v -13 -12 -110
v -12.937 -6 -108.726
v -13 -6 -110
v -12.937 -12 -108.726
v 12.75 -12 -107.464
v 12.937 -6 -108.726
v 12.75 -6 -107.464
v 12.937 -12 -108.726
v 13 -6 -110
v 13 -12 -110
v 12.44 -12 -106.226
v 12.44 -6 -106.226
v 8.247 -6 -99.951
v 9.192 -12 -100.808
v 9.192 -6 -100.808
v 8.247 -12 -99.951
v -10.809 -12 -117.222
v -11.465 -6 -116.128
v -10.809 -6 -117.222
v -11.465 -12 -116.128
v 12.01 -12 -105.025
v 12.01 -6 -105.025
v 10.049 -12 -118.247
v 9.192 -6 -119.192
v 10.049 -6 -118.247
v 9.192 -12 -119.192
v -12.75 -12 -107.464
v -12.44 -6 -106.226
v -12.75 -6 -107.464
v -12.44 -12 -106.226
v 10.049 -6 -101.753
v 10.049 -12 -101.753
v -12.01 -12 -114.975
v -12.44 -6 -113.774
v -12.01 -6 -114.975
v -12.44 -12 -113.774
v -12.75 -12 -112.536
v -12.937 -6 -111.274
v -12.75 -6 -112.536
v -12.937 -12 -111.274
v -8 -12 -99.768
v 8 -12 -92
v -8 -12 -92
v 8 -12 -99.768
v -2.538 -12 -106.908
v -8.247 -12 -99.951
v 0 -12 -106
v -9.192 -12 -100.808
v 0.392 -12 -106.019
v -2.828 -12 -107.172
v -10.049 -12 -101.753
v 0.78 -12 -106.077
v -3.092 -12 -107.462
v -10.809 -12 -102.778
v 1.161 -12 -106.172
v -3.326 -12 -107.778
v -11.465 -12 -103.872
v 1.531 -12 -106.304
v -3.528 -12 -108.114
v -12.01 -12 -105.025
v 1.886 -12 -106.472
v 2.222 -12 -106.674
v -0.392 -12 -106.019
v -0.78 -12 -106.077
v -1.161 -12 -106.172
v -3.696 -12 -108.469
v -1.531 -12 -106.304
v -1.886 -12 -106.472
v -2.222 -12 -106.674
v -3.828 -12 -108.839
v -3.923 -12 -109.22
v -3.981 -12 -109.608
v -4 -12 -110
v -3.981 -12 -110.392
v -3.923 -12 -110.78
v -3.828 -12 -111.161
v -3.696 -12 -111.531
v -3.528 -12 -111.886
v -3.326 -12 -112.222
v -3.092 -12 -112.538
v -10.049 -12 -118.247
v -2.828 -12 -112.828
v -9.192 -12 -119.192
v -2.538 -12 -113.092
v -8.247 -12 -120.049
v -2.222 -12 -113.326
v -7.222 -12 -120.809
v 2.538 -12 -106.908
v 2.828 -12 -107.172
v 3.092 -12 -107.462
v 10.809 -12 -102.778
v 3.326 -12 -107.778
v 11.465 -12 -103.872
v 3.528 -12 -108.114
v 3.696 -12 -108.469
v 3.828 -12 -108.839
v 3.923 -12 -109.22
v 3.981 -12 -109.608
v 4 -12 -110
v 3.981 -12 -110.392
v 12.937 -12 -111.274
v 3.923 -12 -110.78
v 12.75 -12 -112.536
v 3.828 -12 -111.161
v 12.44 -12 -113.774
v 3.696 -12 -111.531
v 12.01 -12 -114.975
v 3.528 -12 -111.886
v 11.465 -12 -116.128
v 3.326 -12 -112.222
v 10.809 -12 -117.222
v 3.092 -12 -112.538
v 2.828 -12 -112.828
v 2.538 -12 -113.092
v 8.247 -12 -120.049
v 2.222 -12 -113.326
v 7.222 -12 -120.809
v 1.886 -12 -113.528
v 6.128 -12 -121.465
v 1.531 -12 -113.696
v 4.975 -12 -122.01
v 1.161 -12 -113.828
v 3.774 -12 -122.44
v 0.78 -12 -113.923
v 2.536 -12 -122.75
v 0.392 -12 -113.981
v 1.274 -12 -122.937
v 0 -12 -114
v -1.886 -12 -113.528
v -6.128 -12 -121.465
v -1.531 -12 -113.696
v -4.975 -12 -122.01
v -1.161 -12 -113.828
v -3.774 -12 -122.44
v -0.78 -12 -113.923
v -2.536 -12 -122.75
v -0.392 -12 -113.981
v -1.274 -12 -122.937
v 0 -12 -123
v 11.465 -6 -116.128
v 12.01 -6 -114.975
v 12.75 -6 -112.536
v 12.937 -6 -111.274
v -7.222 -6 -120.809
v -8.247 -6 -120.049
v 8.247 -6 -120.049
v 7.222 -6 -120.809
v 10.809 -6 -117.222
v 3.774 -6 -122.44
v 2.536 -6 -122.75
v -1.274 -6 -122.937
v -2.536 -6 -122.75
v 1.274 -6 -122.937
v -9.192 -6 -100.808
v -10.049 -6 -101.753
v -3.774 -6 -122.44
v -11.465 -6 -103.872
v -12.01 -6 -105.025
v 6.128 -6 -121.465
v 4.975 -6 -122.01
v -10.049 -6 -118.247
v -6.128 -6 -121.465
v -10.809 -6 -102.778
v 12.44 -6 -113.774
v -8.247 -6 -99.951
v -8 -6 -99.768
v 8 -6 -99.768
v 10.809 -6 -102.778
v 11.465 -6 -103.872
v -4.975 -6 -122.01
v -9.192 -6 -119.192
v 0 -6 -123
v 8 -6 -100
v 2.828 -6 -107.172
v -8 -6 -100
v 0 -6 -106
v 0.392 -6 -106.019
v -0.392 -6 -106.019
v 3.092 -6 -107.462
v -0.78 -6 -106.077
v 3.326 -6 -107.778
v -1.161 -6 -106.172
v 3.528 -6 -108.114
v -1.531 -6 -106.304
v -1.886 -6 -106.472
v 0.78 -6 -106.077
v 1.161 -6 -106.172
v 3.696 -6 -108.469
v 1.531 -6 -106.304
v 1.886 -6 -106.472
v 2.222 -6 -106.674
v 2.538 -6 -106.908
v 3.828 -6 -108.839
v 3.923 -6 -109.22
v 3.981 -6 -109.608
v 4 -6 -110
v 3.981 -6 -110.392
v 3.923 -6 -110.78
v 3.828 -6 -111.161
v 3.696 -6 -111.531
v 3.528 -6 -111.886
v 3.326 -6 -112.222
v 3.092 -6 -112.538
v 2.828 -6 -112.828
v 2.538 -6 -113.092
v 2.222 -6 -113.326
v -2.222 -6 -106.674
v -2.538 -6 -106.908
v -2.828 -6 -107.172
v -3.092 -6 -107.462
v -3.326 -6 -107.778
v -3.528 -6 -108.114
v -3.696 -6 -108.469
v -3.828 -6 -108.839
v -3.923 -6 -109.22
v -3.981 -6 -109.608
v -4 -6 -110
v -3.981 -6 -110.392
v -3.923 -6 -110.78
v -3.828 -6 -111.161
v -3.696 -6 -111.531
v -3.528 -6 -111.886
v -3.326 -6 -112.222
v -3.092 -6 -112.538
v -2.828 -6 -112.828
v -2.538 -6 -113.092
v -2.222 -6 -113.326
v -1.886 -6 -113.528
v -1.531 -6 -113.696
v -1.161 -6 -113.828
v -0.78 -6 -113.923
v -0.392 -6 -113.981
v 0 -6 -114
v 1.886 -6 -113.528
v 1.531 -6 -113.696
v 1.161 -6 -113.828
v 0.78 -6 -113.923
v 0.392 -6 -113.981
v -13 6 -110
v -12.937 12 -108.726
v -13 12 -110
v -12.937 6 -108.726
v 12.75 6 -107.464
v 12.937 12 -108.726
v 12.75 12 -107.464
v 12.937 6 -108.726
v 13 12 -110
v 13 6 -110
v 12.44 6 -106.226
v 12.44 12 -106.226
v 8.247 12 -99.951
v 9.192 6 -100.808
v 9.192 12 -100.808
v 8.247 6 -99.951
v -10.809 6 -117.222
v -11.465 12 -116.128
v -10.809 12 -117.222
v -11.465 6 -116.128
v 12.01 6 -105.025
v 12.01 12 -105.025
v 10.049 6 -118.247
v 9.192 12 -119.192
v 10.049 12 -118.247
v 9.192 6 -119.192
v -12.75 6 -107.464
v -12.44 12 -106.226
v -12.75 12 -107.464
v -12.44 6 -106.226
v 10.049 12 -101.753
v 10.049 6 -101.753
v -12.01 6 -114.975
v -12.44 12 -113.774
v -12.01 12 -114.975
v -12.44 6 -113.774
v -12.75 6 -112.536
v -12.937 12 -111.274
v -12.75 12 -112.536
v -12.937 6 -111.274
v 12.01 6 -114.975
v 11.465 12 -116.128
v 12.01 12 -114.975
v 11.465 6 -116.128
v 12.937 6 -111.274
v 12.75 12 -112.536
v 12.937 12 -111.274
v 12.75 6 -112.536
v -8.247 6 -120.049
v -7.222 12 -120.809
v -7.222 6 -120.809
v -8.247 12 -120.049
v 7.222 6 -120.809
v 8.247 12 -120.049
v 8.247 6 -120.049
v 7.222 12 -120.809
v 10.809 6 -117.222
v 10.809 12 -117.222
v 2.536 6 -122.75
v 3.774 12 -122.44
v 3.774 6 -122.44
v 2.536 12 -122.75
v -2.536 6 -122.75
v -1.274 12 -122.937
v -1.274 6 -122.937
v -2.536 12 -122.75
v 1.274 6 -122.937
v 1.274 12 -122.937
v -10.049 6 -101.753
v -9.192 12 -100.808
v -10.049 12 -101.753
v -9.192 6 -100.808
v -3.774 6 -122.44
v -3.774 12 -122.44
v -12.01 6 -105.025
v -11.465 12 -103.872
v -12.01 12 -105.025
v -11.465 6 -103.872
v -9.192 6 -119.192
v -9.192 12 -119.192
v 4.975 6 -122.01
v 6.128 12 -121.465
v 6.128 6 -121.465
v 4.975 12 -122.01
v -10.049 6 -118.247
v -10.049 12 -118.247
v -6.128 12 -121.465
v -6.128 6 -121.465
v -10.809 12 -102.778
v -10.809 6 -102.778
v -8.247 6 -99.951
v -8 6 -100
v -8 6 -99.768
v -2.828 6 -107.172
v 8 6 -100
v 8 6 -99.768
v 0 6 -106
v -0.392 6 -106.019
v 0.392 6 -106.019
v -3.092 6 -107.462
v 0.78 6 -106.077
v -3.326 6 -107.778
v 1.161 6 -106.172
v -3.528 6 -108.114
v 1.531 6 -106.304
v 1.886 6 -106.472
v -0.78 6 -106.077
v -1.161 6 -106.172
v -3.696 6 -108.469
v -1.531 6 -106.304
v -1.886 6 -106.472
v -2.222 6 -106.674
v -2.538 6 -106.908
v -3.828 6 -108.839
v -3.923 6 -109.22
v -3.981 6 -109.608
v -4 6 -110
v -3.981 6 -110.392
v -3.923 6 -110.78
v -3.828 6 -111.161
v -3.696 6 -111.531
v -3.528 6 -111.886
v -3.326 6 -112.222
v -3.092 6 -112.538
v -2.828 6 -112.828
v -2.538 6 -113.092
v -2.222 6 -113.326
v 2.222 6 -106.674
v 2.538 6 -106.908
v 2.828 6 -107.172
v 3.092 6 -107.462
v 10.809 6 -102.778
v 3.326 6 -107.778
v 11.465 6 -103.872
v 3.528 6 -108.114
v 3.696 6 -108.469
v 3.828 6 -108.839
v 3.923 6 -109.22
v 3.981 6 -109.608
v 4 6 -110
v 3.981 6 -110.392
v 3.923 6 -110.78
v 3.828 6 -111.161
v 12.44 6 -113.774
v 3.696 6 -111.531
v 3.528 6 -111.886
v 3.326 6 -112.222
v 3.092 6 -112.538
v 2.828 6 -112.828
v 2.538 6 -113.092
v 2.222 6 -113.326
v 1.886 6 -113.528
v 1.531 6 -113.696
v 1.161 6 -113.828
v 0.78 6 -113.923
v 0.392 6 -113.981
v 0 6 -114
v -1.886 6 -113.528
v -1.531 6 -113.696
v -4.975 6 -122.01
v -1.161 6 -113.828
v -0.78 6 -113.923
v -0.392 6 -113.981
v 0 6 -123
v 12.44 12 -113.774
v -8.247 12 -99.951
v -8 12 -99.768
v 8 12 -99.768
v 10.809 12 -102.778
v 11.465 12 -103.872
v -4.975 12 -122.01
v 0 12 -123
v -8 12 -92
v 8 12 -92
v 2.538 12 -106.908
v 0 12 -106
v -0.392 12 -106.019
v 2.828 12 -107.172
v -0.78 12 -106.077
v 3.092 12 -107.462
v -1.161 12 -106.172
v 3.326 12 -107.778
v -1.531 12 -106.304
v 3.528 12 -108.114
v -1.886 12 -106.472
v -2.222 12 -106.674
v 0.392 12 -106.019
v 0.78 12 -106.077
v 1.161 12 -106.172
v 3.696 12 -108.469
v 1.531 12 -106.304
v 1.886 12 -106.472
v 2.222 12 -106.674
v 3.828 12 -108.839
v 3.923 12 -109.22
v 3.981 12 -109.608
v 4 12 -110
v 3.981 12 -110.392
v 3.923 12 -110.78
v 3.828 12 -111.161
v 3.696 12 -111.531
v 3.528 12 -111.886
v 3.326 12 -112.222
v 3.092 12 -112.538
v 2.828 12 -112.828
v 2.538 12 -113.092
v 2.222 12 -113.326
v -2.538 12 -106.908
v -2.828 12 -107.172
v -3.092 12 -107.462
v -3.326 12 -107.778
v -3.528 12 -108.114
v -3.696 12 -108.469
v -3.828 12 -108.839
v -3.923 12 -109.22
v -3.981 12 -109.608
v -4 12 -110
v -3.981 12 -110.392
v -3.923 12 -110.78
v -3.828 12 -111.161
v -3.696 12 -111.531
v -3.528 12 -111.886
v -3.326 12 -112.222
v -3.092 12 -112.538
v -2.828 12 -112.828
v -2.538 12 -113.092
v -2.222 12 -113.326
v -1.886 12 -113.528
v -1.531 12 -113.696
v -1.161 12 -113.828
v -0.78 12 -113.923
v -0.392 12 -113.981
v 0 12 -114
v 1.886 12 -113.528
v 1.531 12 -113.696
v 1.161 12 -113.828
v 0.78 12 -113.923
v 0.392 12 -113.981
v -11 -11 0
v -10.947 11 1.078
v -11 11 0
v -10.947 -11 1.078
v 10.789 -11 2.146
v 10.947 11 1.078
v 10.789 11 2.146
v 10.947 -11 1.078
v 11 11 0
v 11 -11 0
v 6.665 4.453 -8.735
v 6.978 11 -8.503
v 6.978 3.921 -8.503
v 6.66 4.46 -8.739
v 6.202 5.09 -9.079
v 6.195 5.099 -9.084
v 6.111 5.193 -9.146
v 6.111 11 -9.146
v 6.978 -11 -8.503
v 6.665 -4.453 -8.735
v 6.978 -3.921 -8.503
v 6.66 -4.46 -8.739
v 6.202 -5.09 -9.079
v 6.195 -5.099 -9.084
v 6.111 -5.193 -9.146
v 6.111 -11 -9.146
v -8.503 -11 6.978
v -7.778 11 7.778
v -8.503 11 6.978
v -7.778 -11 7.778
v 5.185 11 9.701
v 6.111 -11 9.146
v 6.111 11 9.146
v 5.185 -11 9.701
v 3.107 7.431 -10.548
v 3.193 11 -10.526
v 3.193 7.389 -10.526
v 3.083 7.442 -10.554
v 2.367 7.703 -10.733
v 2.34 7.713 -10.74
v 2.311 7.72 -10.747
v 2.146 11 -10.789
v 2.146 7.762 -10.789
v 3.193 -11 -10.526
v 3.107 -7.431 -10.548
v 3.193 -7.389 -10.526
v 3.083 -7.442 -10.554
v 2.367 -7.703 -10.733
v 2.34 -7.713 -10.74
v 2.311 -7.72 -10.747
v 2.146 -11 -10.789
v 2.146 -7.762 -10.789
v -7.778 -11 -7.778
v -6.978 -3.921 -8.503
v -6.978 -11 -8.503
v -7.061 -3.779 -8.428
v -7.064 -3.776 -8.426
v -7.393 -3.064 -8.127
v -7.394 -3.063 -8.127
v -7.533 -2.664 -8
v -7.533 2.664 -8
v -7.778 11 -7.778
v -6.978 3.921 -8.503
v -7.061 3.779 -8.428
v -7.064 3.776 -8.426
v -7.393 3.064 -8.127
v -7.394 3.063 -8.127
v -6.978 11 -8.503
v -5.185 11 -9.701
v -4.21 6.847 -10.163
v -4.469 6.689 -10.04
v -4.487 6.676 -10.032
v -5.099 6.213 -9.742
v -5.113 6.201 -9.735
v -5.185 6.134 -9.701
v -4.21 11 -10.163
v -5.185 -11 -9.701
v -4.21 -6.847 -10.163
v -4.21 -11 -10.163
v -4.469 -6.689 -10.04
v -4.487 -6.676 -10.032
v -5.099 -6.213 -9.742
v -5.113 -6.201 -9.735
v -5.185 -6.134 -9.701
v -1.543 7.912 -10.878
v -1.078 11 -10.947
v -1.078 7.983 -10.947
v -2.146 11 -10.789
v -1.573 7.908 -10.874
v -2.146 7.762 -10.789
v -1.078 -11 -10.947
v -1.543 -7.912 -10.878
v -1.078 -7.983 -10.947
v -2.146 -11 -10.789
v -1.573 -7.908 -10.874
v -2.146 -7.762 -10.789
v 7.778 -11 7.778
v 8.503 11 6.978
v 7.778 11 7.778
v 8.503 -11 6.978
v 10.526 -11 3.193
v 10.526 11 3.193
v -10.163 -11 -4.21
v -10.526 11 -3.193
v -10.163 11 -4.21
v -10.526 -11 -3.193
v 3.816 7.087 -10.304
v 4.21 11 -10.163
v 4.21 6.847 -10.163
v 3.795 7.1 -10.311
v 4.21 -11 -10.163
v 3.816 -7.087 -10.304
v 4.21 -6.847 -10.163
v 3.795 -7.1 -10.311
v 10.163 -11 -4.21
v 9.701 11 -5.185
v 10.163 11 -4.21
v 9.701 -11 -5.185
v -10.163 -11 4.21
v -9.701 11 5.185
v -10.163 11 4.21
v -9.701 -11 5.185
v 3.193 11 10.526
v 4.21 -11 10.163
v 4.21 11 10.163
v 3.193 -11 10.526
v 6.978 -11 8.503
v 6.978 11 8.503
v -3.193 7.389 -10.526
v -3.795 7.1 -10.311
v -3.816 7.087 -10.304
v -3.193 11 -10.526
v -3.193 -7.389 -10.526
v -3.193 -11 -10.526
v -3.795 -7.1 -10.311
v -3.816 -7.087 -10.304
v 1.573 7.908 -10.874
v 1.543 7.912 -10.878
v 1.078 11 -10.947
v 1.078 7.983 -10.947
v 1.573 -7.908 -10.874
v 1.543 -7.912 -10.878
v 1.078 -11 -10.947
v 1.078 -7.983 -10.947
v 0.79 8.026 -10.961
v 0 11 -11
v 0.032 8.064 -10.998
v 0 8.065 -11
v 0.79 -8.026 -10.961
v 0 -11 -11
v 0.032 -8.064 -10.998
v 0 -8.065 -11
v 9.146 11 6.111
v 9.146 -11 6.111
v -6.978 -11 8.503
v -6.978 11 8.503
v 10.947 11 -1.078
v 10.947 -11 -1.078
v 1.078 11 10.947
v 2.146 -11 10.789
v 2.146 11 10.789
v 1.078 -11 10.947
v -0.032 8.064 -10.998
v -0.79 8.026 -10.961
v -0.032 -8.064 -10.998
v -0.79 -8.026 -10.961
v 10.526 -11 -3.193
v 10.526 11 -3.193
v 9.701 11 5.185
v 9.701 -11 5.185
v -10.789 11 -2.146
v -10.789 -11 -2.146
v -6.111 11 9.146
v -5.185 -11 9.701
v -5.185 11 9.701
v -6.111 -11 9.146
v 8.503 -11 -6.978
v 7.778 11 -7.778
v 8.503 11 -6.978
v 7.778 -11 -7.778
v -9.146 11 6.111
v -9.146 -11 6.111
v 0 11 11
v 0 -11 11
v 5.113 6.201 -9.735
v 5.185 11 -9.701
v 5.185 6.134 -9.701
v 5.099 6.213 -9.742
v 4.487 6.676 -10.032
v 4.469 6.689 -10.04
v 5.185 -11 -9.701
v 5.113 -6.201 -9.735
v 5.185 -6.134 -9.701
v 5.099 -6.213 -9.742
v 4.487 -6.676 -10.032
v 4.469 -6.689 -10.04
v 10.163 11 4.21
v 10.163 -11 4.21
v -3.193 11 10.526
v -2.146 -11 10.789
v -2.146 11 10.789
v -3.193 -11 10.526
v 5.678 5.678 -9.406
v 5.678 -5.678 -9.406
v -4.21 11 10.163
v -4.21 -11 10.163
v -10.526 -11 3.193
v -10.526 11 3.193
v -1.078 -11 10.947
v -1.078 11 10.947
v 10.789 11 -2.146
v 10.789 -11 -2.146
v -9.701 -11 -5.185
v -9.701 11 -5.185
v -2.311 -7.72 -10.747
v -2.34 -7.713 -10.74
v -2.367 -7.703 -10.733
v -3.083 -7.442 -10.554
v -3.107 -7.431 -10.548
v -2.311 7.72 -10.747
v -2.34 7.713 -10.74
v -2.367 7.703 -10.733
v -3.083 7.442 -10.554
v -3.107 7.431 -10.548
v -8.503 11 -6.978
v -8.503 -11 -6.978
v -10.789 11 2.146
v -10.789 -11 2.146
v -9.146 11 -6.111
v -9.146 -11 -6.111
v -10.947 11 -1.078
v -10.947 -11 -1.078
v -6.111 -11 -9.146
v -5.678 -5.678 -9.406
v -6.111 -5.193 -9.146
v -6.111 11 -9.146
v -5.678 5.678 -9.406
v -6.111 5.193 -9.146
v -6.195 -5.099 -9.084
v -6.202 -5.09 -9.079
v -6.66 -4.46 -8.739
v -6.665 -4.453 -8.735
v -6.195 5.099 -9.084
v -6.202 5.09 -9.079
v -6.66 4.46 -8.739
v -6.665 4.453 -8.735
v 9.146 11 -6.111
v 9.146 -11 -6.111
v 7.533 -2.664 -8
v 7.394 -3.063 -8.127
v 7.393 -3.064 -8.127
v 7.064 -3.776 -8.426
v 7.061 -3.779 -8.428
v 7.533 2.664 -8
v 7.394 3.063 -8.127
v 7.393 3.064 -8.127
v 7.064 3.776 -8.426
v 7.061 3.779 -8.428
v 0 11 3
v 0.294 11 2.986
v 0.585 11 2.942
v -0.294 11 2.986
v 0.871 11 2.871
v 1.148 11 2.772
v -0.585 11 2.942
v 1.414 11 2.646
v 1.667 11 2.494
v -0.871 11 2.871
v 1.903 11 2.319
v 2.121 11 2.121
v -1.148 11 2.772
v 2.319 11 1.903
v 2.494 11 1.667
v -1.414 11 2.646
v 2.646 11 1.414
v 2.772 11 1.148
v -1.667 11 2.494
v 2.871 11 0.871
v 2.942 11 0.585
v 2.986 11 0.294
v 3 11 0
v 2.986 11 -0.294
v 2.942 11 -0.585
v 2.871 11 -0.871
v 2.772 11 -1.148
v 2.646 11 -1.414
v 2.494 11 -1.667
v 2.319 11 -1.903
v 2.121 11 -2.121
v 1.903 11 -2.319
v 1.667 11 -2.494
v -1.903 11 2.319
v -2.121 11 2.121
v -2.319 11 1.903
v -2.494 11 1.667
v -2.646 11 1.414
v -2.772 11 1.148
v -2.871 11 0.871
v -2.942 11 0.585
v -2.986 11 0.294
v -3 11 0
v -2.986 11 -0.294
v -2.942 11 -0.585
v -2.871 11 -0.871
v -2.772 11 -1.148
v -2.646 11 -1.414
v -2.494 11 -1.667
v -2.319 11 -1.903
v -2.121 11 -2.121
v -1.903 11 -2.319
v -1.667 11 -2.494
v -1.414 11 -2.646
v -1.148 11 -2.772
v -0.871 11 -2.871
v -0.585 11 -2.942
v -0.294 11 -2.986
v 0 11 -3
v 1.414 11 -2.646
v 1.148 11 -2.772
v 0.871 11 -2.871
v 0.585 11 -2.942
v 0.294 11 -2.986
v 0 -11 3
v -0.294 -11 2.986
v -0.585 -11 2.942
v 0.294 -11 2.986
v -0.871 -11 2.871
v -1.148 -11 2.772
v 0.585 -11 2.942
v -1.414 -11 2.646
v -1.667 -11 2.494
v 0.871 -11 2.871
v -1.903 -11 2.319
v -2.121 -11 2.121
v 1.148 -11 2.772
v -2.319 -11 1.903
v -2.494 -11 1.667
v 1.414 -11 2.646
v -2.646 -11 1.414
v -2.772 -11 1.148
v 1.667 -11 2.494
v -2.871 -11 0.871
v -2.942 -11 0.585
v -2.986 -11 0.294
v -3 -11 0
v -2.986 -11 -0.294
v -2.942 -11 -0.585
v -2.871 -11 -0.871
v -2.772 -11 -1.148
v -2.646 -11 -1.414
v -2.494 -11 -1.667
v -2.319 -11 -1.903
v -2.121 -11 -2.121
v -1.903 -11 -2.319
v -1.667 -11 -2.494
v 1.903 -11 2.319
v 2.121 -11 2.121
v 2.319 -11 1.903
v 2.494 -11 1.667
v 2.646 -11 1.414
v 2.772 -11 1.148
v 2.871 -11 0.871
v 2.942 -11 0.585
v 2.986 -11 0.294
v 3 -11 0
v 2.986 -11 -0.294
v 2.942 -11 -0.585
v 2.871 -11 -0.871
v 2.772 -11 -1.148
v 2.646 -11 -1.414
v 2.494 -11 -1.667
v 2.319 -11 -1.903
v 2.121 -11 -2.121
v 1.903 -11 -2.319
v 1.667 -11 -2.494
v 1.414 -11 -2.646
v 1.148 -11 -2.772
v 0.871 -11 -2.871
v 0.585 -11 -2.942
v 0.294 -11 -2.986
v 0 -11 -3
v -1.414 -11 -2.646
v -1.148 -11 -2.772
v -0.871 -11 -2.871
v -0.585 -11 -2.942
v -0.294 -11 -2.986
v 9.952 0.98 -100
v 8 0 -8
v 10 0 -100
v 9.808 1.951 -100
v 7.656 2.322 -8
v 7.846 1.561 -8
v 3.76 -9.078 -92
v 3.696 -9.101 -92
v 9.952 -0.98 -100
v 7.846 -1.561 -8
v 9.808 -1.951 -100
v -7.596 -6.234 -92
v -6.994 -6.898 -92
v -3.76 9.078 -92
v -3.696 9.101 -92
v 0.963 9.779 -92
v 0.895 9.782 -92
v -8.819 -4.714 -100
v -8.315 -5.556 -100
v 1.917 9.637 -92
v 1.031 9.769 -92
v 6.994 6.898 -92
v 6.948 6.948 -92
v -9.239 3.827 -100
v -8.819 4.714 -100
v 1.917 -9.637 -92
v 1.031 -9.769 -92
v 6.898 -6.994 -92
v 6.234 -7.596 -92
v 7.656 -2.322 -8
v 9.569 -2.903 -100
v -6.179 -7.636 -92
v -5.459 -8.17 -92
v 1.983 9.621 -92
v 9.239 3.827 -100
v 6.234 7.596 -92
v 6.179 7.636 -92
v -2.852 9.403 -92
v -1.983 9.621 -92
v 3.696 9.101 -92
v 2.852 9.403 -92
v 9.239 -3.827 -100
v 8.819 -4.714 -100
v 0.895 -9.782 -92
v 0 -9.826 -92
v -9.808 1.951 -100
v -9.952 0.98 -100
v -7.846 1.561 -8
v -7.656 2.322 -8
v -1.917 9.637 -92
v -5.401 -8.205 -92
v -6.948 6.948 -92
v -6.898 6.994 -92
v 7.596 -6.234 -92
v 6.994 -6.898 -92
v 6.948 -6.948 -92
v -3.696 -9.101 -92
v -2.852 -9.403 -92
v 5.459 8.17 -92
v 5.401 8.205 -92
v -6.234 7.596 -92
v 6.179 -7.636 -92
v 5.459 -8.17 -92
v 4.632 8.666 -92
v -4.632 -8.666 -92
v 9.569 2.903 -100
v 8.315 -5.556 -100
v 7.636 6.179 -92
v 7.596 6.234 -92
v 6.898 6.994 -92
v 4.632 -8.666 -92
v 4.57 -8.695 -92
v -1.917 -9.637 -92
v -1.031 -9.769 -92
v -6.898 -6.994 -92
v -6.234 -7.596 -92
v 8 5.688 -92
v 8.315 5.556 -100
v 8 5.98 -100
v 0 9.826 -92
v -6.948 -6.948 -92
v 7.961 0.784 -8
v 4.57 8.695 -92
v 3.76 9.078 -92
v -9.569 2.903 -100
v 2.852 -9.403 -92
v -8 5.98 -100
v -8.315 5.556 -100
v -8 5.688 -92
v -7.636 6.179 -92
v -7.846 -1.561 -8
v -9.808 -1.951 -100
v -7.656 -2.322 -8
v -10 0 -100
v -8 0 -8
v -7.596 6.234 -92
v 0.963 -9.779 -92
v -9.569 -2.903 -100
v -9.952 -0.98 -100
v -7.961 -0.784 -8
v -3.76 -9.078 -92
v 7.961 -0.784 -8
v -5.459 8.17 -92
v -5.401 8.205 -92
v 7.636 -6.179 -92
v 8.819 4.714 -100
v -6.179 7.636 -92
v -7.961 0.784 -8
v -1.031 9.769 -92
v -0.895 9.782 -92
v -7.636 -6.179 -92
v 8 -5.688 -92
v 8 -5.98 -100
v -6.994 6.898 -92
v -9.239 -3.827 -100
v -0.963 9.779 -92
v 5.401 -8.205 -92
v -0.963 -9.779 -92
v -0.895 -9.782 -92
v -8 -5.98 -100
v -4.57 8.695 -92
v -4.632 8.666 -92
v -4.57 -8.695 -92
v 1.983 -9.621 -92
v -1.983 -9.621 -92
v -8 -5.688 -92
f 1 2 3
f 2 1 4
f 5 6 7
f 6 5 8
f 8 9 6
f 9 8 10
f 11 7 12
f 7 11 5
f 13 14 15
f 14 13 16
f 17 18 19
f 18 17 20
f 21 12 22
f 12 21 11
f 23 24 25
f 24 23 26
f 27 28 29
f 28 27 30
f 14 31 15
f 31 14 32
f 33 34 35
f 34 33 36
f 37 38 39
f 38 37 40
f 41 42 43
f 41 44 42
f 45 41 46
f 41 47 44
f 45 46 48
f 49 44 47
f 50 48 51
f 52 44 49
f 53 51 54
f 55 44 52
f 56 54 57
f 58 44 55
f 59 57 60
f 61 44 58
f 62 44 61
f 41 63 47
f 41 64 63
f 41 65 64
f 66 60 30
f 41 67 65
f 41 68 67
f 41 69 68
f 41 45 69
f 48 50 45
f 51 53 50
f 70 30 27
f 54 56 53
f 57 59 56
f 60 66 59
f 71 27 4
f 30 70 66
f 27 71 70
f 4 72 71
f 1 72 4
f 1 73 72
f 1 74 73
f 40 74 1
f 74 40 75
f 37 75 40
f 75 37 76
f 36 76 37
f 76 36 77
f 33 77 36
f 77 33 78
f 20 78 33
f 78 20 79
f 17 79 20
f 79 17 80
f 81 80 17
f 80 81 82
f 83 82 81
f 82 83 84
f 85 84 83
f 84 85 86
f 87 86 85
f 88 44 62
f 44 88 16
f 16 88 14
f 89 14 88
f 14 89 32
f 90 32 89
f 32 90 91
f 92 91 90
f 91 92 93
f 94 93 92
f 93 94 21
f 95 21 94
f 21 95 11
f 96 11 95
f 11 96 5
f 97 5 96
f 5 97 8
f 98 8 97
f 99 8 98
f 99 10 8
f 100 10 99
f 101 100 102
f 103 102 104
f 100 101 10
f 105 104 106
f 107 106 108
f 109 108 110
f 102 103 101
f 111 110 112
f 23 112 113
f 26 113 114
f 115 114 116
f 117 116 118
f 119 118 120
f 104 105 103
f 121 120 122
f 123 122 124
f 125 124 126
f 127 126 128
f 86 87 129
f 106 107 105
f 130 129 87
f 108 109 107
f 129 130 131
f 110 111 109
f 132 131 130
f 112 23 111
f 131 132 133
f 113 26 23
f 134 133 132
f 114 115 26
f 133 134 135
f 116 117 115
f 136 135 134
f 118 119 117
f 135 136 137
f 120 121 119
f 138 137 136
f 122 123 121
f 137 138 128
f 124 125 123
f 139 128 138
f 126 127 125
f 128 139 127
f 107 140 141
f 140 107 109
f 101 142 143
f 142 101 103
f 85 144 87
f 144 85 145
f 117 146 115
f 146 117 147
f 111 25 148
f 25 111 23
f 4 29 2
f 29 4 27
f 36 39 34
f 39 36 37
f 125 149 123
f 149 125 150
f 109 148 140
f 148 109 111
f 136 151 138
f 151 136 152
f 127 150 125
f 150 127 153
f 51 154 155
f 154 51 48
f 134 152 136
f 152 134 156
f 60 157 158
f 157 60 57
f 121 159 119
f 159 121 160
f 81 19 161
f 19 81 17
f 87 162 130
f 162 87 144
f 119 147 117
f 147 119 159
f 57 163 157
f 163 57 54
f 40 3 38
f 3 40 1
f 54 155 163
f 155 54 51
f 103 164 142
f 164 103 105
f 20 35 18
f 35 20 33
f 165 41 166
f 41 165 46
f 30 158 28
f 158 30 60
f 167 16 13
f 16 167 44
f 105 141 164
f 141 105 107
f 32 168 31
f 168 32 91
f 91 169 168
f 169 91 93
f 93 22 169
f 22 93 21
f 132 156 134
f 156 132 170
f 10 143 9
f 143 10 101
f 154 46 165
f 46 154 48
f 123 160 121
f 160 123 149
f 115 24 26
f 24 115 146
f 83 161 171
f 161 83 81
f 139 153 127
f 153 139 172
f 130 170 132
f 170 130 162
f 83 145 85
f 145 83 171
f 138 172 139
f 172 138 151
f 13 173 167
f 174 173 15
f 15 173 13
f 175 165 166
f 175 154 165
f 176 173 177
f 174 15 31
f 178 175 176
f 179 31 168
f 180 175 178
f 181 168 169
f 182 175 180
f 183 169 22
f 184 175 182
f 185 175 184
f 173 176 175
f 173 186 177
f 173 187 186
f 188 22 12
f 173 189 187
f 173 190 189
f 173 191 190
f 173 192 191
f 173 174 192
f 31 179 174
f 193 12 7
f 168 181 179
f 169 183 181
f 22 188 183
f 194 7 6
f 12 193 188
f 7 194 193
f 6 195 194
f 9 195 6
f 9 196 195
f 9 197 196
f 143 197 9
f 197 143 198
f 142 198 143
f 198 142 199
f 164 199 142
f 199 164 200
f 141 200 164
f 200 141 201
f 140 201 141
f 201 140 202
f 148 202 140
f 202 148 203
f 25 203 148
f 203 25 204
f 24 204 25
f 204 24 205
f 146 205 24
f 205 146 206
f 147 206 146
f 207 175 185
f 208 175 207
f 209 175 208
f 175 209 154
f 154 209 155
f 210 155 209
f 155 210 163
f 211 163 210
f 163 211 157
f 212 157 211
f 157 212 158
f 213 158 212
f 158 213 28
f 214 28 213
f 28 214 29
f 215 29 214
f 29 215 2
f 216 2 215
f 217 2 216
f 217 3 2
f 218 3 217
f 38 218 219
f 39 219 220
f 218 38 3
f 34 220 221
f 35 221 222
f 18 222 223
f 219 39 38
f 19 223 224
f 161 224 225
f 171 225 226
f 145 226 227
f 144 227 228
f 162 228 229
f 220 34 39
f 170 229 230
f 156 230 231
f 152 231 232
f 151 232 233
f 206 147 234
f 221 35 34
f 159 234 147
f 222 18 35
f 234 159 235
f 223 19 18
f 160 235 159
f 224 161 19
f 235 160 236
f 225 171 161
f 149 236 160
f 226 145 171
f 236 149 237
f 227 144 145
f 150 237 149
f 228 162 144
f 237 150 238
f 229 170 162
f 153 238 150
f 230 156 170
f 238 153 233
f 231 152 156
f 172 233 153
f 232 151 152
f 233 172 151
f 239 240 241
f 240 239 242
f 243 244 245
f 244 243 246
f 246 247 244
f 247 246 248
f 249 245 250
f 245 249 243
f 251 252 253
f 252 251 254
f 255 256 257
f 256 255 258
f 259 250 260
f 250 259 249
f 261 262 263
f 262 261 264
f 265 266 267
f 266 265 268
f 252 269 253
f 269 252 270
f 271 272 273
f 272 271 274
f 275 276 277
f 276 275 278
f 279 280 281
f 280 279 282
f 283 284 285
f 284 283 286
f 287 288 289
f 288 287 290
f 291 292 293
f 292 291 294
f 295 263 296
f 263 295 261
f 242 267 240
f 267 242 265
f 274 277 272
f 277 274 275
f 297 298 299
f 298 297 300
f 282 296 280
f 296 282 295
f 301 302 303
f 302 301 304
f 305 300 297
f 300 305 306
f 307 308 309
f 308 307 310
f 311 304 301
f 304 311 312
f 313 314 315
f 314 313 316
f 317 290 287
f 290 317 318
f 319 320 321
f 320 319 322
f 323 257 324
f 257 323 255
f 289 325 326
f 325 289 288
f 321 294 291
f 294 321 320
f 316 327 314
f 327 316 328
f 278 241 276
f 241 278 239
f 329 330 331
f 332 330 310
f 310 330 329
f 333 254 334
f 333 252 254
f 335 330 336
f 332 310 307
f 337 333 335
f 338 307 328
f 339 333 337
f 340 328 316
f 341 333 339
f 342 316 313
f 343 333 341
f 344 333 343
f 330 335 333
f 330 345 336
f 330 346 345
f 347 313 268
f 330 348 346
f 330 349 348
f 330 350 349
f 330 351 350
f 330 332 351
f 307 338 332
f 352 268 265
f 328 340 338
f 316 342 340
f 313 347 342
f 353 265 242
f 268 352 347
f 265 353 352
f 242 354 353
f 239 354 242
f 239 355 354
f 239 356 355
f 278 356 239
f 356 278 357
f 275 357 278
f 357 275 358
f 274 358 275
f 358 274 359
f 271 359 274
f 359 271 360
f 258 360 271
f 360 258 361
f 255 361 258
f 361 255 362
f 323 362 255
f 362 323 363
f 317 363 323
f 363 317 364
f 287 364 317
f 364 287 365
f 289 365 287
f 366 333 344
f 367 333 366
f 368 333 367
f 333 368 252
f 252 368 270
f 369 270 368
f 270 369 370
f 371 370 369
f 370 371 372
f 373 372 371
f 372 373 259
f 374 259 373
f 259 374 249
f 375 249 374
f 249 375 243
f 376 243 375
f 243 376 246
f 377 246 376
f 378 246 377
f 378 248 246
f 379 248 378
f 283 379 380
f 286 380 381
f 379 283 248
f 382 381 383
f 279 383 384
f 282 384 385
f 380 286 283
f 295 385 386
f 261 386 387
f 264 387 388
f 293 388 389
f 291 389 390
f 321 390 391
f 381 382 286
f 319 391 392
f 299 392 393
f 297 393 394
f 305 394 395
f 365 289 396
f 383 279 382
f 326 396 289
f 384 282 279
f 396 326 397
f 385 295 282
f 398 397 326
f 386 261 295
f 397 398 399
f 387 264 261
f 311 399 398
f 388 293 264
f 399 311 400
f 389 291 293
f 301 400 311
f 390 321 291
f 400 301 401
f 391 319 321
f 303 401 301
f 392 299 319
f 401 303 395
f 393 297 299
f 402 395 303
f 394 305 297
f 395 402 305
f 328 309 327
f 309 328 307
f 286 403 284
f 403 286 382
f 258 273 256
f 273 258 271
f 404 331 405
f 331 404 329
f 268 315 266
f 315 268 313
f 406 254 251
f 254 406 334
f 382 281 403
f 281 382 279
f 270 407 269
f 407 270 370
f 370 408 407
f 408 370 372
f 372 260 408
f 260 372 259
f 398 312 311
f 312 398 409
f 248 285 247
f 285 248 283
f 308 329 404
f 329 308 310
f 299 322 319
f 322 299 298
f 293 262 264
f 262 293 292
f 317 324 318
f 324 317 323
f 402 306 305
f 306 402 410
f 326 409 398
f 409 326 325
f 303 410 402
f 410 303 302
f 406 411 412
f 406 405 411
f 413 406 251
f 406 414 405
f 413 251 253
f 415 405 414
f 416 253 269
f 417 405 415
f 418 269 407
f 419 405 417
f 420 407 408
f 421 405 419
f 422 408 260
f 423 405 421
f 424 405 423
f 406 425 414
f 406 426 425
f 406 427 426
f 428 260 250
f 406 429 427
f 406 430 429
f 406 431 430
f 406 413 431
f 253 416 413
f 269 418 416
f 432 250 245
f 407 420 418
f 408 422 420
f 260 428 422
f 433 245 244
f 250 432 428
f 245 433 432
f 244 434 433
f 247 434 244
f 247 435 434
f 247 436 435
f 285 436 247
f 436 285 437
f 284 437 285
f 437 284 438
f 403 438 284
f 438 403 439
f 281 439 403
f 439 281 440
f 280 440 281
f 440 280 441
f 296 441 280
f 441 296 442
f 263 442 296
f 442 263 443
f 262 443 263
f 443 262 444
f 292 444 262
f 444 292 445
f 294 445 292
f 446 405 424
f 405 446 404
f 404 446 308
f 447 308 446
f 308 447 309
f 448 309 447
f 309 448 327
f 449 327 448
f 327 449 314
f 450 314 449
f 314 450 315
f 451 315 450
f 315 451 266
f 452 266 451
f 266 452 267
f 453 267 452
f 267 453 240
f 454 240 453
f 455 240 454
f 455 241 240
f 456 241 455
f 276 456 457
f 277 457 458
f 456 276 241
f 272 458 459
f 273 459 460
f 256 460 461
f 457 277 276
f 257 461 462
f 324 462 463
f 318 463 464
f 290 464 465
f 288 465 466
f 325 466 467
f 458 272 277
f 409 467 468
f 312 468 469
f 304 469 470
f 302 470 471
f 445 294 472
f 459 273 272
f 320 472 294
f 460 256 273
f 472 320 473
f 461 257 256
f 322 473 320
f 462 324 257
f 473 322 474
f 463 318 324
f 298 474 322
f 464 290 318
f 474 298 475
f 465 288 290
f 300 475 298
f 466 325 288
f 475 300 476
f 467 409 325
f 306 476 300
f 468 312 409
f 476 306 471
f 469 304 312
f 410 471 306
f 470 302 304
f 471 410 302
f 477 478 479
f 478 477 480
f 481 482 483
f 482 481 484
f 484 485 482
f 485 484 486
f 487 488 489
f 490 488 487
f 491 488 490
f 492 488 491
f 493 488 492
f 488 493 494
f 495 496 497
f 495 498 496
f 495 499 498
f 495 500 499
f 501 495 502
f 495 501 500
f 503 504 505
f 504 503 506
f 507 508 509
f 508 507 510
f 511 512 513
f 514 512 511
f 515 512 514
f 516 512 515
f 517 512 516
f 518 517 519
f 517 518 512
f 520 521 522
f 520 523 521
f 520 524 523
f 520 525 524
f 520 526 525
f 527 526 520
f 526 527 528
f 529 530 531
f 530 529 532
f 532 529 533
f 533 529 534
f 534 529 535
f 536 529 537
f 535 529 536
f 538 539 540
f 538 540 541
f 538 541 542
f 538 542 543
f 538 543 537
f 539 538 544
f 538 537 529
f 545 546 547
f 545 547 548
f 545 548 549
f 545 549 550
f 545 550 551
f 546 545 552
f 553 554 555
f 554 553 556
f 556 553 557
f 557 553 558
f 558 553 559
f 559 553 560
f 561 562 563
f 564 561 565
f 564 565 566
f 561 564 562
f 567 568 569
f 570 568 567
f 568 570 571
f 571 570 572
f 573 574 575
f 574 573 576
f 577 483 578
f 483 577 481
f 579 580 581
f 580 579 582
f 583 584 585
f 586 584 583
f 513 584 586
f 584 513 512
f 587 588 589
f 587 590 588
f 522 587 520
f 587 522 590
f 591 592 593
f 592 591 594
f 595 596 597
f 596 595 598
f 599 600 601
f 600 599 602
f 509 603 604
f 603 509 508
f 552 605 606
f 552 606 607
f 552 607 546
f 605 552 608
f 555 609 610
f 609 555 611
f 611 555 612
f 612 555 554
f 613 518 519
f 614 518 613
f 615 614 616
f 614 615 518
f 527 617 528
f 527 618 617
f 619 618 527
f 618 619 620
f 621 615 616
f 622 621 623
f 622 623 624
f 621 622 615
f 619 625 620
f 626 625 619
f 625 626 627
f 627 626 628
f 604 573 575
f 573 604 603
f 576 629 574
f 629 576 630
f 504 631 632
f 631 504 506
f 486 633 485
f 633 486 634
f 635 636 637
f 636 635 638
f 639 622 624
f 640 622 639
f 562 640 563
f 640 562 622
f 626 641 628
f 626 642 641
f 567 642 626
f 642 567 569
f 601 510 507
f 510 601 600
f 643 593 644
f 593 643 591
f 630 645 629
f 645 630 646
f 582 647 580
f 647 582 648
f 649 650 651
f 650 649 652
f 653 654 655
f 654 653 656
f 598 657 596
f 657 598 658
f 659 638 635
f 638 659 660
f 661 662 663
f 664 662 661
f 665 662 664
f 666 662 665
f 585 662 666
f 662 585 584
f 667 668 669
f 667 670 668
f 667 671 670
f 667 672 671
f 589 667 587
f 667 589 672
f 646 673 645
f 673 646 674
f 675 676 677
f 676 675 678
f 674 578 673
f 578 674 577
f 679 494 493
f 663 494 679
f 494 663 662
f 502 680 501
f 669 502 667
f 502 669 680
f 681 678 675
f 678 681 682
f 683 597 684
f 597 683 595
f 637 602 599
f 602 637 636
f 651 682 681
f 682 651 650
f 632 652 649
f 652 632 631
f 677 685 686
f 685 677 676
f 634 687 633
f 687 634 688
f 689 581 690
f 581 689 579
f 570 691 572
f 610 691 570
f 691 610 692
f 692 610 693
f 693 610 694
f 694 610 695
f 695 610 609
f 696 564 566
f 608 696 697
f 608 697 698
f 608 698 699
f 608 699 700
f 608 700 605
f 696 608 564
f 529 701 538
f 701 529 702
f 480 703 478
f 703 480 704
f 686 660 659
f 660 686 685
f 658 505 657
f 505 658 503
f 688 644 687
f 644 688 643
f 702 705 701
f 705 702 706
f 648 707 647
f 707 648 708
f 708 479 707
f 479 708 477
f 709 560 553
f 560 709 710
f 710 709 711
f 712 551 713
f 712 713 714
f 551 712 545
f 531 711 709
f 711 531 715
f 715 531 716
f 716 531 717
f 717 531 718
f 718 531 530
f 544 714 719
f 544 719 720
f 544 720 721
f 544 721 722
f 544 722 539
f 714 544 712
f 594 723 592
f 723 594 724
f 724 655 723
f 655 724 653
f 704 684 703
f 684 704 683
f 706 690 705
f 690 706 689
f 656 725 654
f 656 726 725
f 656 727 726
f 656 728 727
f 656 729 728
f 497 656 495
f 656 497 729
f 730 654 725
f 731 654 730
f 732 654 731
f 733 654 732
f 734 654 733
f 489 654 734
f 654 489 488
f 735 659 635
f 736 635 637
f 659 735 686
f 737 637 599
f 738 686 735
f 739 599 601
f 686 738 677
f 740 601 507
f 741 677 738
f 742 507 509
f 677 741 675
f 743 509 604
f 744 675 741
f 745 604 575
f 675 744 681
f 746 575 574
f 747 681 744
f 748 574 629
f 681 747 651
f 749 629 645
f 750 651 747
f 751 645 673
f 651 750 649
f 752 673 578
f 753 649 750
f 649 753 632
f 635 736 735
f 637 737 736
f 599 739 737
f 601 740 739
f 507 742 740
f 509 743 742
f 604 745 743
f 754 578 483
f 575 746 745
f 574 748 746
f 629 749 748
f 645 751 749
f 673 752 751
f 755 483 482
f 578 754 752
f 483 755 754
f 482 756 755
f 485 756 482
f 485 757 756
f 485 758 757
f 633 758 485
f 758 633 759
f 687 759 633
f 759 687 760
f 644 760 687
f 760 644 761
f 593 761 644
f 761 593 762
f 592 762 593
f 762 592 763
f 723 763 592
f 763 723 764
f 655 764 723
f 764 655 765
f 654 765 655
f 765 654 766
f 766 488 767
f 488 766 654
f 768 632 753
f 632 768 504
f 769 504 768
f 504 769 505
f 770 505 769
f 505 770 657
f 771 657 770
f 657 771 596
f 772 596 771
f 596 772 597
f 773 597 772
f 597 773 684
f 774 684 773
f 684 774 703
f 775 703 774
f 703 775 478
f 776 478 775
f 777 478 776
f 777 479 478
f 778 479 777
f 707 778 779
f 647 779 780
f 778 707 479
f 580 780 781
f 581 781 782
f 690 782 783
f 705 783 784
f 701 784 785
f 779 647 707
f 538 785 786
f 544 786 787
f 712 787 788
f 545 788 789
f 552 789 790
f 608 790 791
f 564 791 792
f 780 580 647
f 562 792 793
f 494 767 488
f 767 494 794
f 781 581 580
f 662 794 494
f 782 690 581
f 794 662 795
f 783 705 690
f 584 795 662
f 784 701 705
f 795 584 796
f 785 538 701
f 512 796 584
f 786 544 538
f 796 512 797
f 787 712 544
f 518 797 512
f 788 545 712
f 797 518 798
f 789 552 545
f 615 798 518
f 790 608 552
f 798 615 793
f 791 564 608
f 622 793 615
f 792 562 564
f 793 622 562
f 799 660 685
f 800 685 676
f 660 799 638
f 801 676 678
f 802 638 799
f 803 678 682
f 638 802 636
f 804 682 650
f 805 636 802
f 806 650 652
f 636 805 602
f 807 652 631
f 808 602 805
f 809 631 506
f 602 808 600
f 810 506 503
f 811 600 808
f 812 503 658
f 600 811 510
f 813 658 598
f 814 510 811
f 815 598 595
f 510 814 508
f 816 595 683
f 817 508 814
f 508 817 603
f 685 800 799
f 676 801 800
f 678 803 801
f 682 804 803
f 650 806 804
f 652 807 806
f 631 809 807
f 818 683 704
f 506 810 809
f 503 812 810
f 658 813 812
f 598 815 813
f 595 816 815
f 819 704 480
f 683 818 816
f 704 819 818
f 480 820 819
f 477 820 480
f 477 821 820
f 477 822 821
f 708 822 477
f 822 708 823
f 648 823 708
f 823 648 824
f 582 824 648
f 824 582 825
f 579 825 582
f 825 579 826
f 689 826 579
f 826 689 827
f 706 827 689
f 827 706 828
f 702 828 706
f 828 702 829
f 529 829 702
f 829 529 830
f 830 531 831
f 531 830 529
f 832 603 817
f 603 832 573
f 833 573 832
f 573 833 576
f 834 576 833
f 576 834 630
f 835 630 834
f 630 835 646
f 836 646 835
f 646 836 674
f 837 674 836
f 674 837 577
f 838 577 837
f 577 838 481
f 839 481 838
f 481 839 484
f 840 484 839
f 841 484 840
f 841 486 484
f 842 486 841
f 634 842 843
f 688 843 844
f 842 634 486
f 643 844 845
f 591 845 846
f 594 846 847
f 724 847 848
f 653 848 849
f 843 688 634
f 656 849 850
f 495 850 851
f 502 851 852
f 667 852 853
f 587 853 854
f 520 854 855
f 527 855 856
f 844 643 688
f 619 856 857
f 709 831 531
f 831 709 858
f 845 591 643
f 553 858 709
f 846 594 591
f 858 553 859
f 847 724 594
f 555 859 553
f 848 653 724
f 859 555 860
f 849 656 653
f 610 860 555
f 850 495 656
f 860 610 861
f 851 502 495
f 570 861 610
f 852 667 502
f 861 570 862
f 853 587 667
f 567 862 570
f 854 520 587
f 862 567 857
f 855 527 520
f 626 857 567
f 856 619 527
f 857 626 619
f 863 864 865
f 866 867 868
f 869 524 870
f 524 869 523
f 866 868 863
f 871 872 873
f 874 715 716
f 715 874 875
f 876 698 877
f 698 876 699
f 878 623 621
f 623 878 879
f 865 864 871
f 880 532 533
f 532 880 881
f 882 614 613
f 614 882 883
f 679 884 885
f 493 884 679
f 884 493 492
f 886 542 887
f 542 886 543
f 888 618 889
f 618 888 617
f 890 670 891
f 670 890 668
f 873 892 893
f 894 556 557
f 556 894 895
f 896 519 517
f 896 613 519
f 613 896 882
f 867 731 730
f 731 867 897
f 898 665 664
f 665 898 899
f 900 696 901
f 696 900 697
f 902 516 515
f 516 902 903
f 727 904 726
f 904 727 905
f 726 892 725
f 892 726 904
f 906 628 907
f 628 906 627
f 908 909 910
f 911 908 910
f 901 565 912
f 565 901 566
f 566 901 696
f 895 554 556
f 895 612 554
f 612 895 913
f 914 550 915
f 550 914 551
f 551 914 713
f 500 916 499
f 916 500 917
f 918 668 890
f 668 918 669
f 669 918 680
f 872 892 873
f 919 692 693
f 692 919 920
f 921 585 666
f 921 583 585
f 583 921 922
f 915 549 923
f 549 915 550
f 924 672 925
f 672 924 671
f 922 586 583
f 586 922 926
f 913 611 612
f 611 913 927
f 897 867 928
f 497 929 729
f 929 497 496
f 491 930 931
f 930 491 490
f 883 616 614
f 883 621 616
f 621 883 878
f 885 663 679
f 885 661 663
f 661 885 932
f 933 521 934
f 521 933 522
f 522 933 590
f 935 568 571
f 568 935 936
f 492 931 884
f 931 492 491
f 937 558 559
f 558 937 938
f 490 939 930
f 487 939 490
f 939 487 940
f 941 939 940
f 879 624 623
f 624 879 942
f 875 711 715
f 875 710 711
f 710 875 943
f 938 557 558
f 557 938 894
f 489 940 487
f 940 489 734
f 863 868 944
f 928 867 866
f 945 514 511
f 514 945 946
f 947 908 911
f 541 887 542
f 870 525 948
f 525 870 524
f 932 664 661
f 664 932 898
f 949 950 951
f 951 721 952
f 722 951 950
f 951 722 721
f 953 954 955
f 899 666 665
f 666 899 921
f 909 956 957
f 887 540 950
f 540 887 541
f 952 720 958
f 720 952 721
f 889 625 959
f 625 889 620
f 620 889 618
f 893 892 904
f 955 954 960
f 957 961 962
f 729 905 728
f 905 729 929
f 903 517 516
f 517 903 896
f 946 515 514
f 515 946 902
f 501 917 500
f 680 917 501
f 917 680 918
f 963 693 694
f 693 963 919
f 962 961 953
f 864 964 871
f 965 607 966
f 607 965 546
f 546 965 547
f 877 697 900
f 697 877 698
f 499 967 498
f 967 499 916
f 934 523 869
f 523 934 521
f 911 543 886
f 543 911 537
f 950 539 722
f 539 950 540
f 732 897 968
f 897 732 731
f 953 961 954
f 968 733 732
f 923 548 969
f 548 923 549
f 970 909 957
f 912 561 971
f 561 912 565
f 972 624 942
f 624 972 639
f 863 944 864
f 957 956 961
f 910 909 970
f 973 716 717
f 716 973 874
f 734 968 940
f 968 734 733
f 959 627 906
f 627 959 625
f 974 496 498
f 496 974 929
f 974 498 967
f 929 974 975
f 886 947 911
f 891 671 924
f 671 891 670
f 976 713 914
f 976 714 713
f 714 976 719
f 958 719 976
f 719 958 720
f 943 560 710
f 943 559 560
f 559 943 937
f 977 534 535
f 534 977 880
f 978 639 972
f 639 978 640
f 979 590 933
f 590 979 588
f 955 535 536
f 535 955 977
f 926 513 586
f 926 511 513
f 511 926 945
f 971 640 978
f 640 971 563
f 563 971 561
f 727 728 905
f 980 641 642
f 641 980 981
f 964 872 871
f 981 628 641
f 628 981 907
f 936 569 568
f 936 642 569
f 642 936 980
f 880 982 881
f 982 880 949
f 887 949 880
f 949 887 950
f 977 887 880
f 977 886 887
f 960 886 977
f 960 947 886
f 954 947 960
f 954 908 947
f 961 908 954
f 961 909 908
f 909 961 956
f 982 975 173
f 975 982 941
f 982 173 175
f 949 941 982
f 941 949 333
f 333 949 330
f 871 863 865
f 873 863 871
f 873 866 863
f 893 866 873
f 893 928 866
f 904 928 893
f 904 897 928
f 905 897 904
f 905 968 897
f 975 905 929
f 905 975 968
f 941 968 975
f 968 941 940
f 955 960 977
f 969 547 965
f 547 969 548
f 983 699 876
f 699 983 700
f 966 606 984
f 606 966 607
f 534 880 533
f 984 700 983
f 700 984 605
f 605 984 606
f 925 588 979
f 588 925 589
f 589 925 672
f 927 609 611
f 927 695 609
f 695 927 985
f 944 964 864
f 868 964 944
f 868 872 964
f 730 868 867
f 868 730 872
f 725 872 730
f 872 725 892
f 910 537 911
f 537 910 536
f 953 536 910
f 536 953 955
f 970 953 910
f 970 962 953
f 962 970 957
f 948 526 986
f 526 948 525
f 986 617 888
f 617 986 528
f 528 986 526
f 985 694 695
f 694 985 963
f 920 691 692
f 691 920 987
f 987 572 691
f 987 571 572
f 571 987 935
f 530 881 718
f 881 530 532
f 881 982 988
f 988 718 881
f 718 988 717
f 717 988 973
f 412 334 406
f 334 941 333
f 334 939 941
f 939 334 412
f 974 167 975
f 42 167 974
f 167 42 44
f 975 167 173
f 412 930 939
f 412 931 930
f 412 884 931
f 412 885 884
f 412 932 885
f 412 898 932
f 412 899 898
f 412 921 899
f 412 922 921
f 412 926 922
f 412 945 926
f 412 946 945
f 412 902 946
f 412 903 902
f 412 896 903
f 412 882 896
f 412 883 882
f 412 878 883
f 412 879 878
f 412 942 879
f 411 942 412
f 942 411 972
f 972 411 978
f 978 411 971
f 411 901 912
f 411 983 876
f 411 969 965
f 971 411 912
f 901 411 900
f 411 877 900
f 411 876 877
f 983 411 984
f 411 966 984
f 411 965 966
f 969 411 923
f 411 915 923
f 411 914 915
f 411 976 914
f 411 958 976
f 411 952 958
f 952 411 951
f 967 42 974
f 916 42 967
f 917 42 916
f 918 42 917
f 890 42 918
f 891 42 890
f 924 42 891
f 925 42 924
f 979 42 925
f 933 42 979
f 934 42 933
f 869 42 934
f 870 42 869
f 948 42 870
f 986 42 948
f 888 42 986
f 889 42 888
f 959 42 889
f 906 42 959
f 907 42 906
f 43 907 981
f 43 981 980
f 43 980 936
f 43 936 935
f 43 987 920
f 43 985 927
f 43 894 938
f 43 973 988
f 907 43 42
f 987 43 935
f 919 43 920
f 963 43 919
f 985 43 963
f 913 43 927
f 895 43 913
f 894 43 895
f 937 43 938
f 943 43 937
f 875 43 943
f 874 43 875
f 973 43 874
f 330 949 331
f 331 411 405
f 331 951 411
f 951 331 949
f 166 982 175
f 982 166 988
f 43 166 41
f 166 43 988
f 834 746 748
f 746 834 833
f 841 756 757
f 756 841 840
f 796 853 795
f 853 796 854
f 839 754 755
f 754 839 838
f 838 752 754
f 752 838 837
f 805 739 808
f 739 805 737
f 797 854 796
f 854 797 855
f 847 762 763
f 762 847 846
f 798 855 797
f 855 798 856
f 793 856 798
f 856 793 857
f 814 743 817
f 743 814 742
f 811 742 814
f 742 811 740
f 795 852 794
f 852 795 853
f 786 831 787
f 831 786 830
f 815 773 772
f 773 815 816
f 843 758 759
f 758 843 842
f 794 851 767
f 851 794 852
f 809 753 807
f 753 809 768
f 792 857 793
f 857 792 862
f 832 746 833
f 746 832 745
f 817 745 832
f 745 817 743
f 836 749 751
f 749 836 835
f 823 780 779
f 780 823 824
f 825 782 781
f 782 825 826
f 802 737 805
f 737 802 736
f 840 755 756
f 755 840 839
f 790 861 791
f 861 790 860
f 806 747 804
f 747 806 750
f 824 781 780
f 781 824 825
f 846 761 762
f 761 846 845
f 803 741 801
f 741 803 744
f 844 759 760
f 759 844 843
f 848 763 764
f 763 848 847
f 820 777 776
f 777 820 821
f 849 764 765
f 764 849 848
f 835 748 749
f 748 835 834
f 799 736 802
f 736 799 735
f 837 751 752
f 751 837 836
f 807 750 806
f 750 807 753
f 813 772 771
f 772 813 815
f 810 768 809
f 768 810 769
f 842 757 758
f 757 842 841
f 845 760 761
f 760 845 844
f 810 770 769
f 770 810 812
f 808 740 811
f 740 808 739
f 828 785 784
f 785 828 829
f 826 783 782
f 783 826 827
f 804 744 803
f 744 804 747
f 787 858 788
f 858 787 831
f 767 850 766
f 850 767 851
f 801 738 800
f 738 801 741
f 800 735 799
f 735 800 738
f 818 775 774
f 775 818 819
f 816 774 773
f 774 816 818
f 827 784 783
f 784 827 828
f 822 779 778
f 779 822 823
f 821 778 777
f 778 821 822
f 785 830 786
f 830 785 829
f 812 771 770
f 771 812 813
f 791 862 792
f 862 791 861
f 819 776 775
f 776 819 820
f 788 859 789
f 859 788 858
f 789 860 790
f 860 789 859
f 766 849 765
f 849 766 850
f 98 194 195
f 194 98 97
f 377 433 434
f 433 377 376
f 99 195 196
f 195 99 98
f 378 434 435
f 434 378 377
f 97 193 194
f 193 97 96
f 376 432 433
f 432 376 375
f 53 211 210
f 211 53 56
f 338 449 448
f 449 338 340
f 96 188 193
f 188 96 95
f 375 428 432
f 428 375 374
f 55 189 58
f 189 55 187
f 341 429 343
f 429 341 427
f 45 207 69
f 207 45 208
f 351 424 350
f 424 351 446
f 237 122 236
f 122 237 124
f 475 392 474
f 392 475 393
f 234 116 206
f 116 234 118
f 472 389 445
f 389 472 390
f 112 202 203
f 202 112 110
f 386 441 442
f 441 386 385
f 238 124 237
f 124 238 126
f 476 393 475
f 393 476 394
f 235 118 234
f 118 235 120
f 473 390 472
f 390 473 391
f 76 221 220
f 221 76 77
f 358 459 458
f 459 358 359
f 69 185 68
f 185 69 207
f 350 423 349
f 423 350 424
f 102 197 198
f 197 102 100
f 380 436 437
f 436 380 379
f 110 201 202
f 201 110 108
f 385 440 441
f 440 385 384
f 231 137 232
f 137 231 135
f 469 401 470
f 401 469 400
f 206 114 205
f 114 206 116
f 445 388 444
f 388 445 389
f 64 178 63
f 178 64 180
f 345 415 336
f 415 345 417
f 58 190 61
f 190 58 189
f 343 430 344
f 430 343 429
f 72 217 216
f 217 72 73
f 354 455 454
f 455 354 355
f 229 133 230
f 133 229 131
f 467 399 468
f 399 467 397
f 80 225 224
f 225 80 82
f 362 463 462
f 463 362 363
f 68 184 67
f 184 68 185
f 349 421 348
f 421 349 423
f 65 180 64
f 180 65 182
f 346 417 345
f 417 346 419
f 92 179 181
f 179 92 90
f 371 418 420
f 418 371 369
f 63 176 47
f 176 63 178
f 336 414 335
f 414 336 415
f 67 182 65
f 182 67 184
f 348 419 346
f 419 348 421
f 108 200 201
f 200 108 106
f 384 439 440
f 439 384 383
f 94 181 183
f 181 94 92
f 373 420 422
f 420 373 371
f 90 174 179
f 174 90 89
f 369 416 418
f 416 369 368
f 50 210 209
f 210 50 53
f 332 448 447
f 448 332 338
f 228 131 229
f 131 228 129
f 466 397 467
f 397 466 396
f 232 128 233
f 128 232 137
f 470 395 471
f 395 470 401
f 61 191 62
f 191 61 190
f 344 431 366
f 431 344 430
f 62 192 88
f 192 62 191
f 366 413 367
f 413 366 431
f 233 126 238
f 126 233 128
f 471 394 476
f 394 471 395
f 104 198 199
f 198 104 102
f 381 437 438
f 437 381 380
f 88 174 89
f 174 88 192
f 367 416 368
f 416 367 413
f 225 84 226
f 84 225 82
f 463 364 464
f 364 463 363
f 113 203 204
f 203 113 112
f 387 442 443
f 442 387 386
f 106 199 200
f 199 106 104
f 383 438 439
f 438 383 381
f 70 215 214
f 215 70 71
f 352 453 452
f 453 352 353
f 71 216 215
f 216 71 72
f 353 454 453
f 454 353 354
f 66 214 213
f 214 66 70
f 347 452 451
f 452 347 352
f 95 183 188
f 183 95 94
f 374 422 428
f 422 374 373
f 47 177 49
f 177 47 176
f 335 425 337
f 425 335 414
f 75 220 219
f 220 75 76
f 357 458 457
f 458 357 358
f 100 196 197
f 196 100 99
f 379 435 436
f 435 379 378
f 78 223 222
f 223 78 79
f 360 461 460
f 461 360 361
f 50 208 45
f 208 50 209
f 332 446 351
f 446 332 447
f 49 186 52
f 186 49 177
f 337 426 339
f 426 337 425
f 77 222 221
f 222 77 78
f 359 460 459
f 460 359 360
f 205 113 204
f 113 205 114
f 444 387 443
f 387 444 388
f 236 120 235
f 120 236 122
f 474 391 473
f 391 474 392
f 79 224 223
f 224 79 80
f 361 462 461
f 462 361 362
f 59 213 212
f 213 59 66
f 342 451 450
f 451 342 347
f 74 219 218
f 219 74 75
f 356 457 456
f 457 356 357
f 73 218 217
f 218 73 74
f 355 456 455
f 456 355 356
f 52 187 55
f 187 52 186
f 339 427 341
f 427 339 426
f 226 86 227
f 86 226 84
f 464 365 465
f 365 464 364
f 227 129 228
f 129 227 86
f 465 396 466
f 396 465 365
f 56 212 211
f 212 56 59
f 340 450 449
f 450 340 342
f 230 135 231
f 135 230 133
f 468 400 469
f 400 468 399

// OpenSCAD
// file: params.scad
$fn = 64;

femur_length_mm = 110;
tibia_length_mm = 100;

hip_hub_width_mm = 22;
hip_hub_radius_mm = 11;
hip_pin_dia_mm = 6;

femur_shaft_prox_dia_mm = 20;
femur_shaft_dist_dia_mm = 16;
femur_prox_offset_mm = 8;
femur_dist_offset_mm = 10;
femur_bridge_height_mm = 8;

knee_fork_gap_mm = 12;
knee_fork_plate_mm = 6;
knee_hub_radius_mm = 13;
knee_pin_dia_mm = 8;

tibia_hub_radius_mm = 10;
tibia_shaft_prox_dia_mm = 14;
tibia_shaft_dist_dia_mm = 10;
tibia_prox_offset_mm = 8;
tibia_dist_offset_mm = 8;

ankle_hub_radius_mm = 9;
ankle_hub_width_mm = 16;
ankle_pin_dia_mm = 6;

knee_angle_deg = 25;
hip_angle_deg = 0;
ankle_angle_deg = -(hip_angle_deg + knee_angle_deg);

hip_base_gap_mm = hip_hub_width_mm;
hip_base_plate_mm = 6;
hip_base_radius_mm = 15;
hip_base_tower_top_mm = 34;
hip_base_tower_width_x_mm = 26;
hip_base_mount_size_x_mm = 70;
hip_base_mount_size_y_mm = 50;
hip_base_mount_thickness_mm = 8;
hip_base_bolt_dia_mm = 6;

foot_plate_mm = 5;
foot_fork_radius_mm = 11;
foot_column_width_x_mm = 24;
foot_column_top_mm = -ankle_hub_radius_mm;
foot_column_bottom_mm = -19;
foot_sole_top_mm = -18;
foot_sole_length_mm = 85;
foot_sole_width_mm = 34;
foot_sole_thickness_mm = 8;
foot_sole_center_x_mm = 27.5;
// main file
include <params.scad>

module femur() {
    difference() {
        union() {
            rotate([90, 0, 0])
                cylinder(h = hip_hub_width_mm, d = 2 * hip_hub_radius_mm, center = true);

            translate([0, 0, -(femur_length_mm - femur_dist_offset_mm)])
                cylinder(
                    h = femur_length_mm - femur_prox_offset_mm - femur_dist_offset_mm,
                    d1 = femur_shaft_prox_dia_mm,
                    d2 = femur_shaft_dist_dia_mm
                );

            translate([0, 0, -(femur_length_mm - femur_dist_offset_mm) + femur_bridge_height_mm / 2])
                cube([
                    femur_shaft_dist_dia_mm,
                    knee_fork_gap_mm + 2 * knee_fork_plate_mm,
                    femur_bridge_height_mm
                ], center = true);

            for (s = [-1, 1])
                translate([0, s * (knee_fork_gap_mm + knee_fork_plate_mm) / 2, -femur_length_mm])
                    rotate([90, 0, 0])
                        cylinder(h = knee_fork_plate_mm, d = 2 * knee_hub_radius_mm, center = true);
        }

        rotate([90, 0, 0])
            cylinder(h = hip_hub_width_mm + 2, d = hip_pin_dia_mm, center = true);

        translate([0, 0, -femur_length_mm])
            rotate([90, 0, 0])
                cylinder(
                    h = knee_fork_gap_mm + 2 * knee_fork_plate_mm + 2,
                    d = knee_pin_dia_mm,
                    center = true
                );
    }
}

femur();
